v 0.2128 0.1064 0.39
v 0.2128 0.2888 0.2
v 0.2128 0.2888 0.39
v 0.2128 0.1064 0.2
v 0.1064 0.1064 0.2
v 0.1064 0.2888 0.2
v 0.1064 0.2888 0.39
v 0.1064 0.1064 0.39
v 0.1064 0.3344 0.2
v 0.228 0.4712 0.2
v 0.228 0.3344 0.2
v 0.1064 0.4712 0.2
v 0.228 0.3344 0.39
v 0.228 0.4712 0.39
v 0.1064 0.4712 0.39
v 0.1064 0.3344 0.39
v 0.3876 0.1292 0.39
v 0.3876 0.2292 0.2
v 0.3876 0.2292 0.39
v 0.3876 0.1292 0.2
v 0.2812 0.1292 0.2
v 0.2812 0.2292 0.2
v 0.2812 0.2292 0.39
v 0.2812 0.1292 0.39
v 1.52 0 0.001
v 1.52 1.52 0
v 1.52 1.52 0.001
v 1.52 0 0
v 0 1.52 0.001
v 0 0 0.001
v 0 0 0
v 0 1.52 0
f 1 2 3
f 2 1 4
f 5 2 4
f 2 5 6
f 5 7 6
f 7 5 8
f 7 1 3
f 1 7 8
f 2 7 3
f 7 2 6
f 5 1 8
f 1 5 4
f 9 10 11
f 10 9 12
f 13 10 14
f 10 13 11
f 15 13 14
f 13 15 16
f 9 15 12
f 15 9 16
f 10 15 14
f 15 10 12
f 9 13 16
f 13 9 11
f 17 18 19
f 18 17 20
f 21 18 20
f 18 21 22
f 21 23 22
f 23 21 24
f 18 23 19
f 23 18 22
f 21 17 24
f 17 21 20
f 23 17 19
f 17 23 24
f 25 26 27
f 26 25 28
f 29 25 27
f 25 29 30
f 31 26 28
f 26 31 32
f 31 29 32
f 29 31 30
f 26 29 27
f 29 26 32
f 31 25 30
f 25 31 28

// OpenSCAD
// file: lef_scad_config.scad
// configuration

layers = [
"met1",
"met2",
"met3",
"met4",
"met5",
"met6",
"met7",
"met8",
"met9"
] ;

platform_config = [
["lpv",   20],
["px",    7.6e-3],
["layer", 10e-3],
["pitch", 30],
["via_w", 14],
["bottom_layers", 20],
["chan_def", [14, 10]]
] ;

io_loc_layer = [
  [[960, 660, "met9"],[1050, 660, "met9"],[1140, 660, "met9"],[1230, 660, "met9"],[1320, 660, "met9"],
  [1410, 660, "met9"],[1500, 660, "met9"],[1590, 660, "met9"]
  ],
  [[960, 750, "met9"],[1050, 750, "met9"],[1140, 750, "met9"],[1230, 750, "met9"],[1320, 750, "met9"],
  [1410, 750, "met9"],[1500, 750, "met9"],[1590, 750, "met9"]
  ],
  [[960, 840, "met9"],[1050, 840, "met9"],[1140, 840, "met9"],[1230, 840, "met9"],[1320, 840, "met9"],
  [1410, 840, "met9"],[1500, 840, "met9"],[1590, 840, "met9"]
  ],
  [[960, 930, "met9"],[1050, 930, "met9"],[1140, 930, "met9"],[1230, 930, "met9"],[1320, 930, "met9"],
  [1410, 930, "met9"],[1500, 930, "met9"],[1590, 930, "met9"]
  ]
] ;
// main file
include <lef_scad_config.scad>

ren_th = 0.1 ;

port_clr1 = "red" ;
port_clr2 = "blue" ;

/**
 * Apply LEF/DEF style orientation changes specified by a text flag.
 * See LEF/DEF 5.8 Language Reference manual page 244
 * There is currently no way in OpenSCAD to determine bounding box
 * to do automatic translation, you will need to provide it.
 */
module orientation(width, height, orient) {
    if (orient == "N" || orient == "R0"){
        children();
    } else if (orient == "S" || orient == "R180"){
        translate([width, height, 0])
        rotate([0, 0, 180])
        children();
    } else if (orient == "E" || orient == "R270") {
        translate([0, width, 0])
        rotate([0, 0, 270])
        children();
    } else if (orient == "W" || orient == "R90") {
        translate([height, 0, 0])
        rotate([0, 0, 90])
        children();
    } else if (orient == "FN" || orient == "MY"){
        translate([width, 0, 0])
        mirror([1, 0, 0])
        children();
    } else if (orient == "FS" || orient == "MX"){
        translate([0, height, 0])
        mirror([0, 1, 0])
        children();
    } else if (orient == "FE" || orient == "MY90" || orient == "MYR90") {
        translate([height, width, 0])
        rotate([0, 0, 270])
        mirror([0, 1, 0])
        children();
    } else if (orient == "FW" || orient == "MX90" || orient == "MXR90") {
        translate([0, 0, 0])
        rotate([0, 0, 270])
        mirror([1, 0, 0])
        children();
    } else {
        assert(false, concat("Unknown rotation applied", orient));
    }
}

module lef_obs(geometry, pts, px=0, layer=0)
{
    if(geometry=="RECT" || geometry=="rect")
    {
        %lef_rect(pts*get_config("px"), get_config("layer")*get_config("lpv")) ;
    }
}

module lef_port(port_name="", direction="", geometry="", pts=false, px=0, layer_h=0, layer=false, center=true)
{
    if(port_name=="" || direction=="" || geometry=="" || pts==false)
        echo("module def: lef_port(port_name, direction, geom, pts)") ;

    port_center = (
      len(pts)==4 ? [
        (pts[0]+pts[2])/2, ///2-get_config("via_w")/2,
        (pts[1]+pts[3])/2, ///2-get_config("via_w")/2,
        (pts[0]+pts[2])/2, ///2+get_config("via_w")/2,
        (pts[1]+pts[3])/2 ///2+get_config("via_w")/2
      ] : (len(pts)==2 ?
        (!is_num(pts[0]) ?
          [
            (pts[0][0]+pts[1][0])/2,
            (pts[0][1]+pts[1][1])/2,
            (pts[0][0]+pts[1][0])/2,
            (pts[0][1]+pts[1][1])/2,
          ] :
          (center ?
           pts : pts - get_config("chan_def")/2))
      : [])
      ) ;


    chan_centered = (
      len(pts) == 4 ? [
      -get_config("chan_def")[0]/2,
      -get_config("chan_def")[0]/2,
      get_config("chan_def")[0]/2,
      get_config("chan_def")[0]/2,
      ] :
        (!is_num(pts) == 2 ? [
            -get_config("chan_def")[0]/2,
            -get_config("chan_def")[0]/2,
            get_config("chan_def")[0]/2,
            get_config("chan_def")[0]/2,
          ] :
          [
            get_config("chan_def")[0],
            get_config("chan_def")[0]
          ]
          )
    );

    echo(len(pts)) ;
    echo(port_center) ;
    echo(chan_centered) ;

    if(geometry=="RECT" || geometry=="rect")
    {
        if(len(pts)==4){
        color(port_clr1)
        lef_rect(
            (port_center + chan_centered
            )*(px!=0?px:get_config("px")),
            (layer_h!=0?layer_h:get_config("chan_def")[1])*get_config("layer") // get channel height
            ) ;
        color(port_clr2, 0.6)
            lef_rect(
            pts*(px!=0?px:get_config("px")),
            //(layer_h!=0?layer_h:get_config("layer")) * (get_config("lpv")-1)) ;
            (layer_h!=0?layer_h:get_config("layer")) * (get_config("lpv")-1)
            ) ;
            //[
              //(pts[0]+pts[2])/2-get_config("via_w")/2,
              //(pts[1]+pts[3])/2-get_config("via_w")/2,
              //(pts[0]+pts[2])/2+get_config("via_w")/2,
              //(pts[1]+pts[3])/2+get_config("via_w")/2
            //]
        }
        if(len(pts)==2)
        {
          if(is_num(pts[0])){
            color(port_clr1)
            lef_rect(
                (pts
                )*(px!=0?px:get_config("px")),
                (layer_h!=0?layer_h:get_config("chan_def")[1])*get_config("layer"), // get channel height
                center=center
                ) ;
            color(port_clr2, 0.6)
            lef_rect(
                (pts
                ) * (px!=0?px:get_config("px")),
                (layer_h!=0?layer_h:get_config("layer"))*(get_config("lpv")-1),
                center=center
                ) ;
          } else {
            color(port_clr1)
            lef_rect(
                (port_center + chan_centered
                )*(px!=0?px:get_config("px")),
                (layer_h!=0?layer_h:get_config("chan_def")[1])*get_config("layer"), // get channel height
                center=center
                ) ;
            color(port_clr2, 0.6)
        lef_rect(
            [pts[0],pts[1],
            pts[0]+get_config("via_w"),
            pts[1]+get_config("via_w")]*(px!=0?px:get_config("px")),
                (layer_h!=0?layer_h:get_config("layer"))*(get_config("lpv")-1),
                center=center
                ) ;
          }
        }
    }
}

module lef_rect(pts, th=ren_th, center=true)
{
    w  = (len(pts)==2 ?
          (!is_num(pts[0]) ? abs(pts[0][0] - pts[1][0]):
            get_config("chan_def")[0]*get_config("px")):
        (len(pts)==4?abs(pts[0] - pts[2]):0));
    h  = (len(pts)==2 ?
          (!is_num(pts[0]) ? abs(pts[0][1] - pts[1][1]):
            get_config("chan_def")[1]*get_config("layer")):
        (len(pts)==4?abs(pts[1] - pts[3]):0));
    ox = (len(pts)==2 ?
          (!is_num(pts[0]) ? abs(pts[0][0]):
            (center ? pts[0]-get_config("chan_def")[0]/2*get_config("px"):pts[0])):
        (len(pts)==4?abs(pts[0]):0));
    oy = (len(pts)==2 ?
          (!is_num(pts[0]) ? abs(pts[0][1]):
            (center ? pts[1]-get_config("chan_def")[0]/2*get_config("px"):pts[0])):
        (len(pts)==4?abs(pts[1]):0));

    echo(ox, oy) ;
    translate([ox, oy, 0])
        cube([w, h, th]) ;
}

module lef_layer(layer_name)
{
    l_off = get_config("layer") * get_config("lpv") * get_layer_index(layer_name) ;

    translate([0,0,l_off])
        children() ;
}

module lef_size(X, Y)
{
    cube([X*get_config("px"), Y*get_config("px"), get_config("layer")*0.1]);
}

function get_layer_index(x) = search([x], layers)[0] ;

function get_config(prop) = platform_config[search([prop], platform_config)[0]][1] ;

function get_io_layer(x1, x2) = io_loc_layer[x1][x2] ;


lef_size(200, 200) ;

lef_layer("met1")
    lef_obs("RECT", [0,0,100,120]) ;
lef_layer("met2")
    lef_obs("RECT", [0,0,100,120]) ;

lef_layer("met2")
    lef_port("", "", "RECT", [14,14,28,38]) ;

lef_layer("met2")
    lef_port("", "", "RECT", [14,44,30,62]) ;

lef_layer("met2")
    lef_port("", "", "RECT", [44,24]) ;
